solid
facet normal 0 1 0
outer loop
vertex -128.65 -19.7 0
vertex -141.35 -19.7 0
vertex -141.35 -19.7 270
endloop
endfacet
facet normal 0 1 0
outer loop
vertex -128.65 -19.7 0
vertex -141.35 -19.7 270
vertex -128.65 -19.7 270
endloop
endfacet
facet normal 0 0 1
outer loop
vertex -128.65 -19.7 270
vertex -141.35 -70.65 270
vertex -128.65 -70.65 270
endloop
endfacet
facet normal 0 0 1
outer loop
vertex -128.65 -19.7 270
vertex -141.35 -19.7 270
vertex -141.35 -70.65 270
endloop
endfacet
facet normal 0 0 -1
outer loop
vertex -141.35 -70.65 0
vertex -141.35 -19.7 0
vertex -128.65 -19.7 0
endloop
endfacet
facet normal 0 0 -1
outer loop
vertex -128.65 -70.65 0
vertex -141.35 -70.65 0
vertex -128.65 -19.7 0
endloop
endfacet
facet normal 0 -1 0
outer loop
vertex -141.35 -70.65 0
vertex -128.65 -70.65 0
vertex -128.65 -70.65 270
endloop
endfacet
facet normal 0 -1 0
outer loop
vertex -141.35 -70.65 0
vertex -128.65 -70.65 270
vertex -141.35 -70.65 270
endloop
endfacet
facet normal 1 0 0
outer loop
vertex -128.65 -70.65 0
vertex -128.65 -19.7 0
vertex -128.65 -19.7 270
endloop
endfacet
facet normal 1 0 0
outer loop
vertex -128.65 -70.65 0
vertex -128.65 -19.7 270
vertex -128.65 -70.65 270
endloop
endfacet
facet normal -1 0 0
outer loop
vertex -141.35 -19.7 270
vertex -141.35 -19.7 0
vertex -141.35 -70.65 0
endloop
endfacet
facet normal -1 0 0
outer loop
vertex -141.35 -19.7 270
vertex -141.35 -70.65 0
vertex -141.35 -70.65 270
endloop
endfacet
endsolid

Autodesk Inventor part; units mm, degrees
ref_plane "YZ Plane" through (0, 0, 0) normal (1, 0, 0) x (0, 1, 0)
ref_plane "XZ Plane" through (0, 0, 0) normal (0, 1, 0) x (-1, 0, 0)
ref_plane "XY Plane" through (0, 0, 0) normal (0, 0, 1) x (1, 0, 0)
sketch "Sketch1" plane through (0, 0, 0) normal (0, 0, 1) x (1, 0, 0)
  line L0 (135, -70.65) -> (-135, -70.65) projected
  line L1 (-135, -7) -> (-128.65, -7)
  line L2 (-128.65, -7) -> (-128.65, -70.65)
  line L3 (-128.65, -70.65) -> (-135, -70.65)
  line L4 (-135, -70.65) -> (-135, -7)
  point P0 (0, 0)
  dimension "d0" = 6.35
extrude "Extrusion1" add sketch "Sketch1" along normal blind 270
sketch "Sketch2" plane through (-135, -70.65, 0) normal (-1, 0, 0) x (0, 0, 1)
  line L0 (0, 63.65) -> (0, 0) projected
  line L1 (270, 63.65) -> (270, 0) projected
  line L2 (0, 63.65) -> (270, 63.65)
  line L3 (270, 63.65) -> (270, 0)
  line L4 (270, 0) -> (0, 0)
  line L5 (0, 0) -> (0, 63.65)
  point P0 (0, 70.65)
extrude "Extrusion2" add sketch "Sketch2" along normal blind 6.35
sketch "Sketch3" plane through (-128.65, -7, 270) normal (0, 1, 0) x (1, 0, 0)
  line L0 (33, 330) -> (-71, 330)
  line L1 (-71, 330) -> (-71, -74)
  line L2 (-71, -74) -> (33, -74)
  line L3 (33, -74) -> (33, 330)
  point P0 (128.65, 270)
extrude "Extrusion3" cut sketch "Sketch3" against normal blind 12.7
properties part number "Front" material "Default New Material(1)"
